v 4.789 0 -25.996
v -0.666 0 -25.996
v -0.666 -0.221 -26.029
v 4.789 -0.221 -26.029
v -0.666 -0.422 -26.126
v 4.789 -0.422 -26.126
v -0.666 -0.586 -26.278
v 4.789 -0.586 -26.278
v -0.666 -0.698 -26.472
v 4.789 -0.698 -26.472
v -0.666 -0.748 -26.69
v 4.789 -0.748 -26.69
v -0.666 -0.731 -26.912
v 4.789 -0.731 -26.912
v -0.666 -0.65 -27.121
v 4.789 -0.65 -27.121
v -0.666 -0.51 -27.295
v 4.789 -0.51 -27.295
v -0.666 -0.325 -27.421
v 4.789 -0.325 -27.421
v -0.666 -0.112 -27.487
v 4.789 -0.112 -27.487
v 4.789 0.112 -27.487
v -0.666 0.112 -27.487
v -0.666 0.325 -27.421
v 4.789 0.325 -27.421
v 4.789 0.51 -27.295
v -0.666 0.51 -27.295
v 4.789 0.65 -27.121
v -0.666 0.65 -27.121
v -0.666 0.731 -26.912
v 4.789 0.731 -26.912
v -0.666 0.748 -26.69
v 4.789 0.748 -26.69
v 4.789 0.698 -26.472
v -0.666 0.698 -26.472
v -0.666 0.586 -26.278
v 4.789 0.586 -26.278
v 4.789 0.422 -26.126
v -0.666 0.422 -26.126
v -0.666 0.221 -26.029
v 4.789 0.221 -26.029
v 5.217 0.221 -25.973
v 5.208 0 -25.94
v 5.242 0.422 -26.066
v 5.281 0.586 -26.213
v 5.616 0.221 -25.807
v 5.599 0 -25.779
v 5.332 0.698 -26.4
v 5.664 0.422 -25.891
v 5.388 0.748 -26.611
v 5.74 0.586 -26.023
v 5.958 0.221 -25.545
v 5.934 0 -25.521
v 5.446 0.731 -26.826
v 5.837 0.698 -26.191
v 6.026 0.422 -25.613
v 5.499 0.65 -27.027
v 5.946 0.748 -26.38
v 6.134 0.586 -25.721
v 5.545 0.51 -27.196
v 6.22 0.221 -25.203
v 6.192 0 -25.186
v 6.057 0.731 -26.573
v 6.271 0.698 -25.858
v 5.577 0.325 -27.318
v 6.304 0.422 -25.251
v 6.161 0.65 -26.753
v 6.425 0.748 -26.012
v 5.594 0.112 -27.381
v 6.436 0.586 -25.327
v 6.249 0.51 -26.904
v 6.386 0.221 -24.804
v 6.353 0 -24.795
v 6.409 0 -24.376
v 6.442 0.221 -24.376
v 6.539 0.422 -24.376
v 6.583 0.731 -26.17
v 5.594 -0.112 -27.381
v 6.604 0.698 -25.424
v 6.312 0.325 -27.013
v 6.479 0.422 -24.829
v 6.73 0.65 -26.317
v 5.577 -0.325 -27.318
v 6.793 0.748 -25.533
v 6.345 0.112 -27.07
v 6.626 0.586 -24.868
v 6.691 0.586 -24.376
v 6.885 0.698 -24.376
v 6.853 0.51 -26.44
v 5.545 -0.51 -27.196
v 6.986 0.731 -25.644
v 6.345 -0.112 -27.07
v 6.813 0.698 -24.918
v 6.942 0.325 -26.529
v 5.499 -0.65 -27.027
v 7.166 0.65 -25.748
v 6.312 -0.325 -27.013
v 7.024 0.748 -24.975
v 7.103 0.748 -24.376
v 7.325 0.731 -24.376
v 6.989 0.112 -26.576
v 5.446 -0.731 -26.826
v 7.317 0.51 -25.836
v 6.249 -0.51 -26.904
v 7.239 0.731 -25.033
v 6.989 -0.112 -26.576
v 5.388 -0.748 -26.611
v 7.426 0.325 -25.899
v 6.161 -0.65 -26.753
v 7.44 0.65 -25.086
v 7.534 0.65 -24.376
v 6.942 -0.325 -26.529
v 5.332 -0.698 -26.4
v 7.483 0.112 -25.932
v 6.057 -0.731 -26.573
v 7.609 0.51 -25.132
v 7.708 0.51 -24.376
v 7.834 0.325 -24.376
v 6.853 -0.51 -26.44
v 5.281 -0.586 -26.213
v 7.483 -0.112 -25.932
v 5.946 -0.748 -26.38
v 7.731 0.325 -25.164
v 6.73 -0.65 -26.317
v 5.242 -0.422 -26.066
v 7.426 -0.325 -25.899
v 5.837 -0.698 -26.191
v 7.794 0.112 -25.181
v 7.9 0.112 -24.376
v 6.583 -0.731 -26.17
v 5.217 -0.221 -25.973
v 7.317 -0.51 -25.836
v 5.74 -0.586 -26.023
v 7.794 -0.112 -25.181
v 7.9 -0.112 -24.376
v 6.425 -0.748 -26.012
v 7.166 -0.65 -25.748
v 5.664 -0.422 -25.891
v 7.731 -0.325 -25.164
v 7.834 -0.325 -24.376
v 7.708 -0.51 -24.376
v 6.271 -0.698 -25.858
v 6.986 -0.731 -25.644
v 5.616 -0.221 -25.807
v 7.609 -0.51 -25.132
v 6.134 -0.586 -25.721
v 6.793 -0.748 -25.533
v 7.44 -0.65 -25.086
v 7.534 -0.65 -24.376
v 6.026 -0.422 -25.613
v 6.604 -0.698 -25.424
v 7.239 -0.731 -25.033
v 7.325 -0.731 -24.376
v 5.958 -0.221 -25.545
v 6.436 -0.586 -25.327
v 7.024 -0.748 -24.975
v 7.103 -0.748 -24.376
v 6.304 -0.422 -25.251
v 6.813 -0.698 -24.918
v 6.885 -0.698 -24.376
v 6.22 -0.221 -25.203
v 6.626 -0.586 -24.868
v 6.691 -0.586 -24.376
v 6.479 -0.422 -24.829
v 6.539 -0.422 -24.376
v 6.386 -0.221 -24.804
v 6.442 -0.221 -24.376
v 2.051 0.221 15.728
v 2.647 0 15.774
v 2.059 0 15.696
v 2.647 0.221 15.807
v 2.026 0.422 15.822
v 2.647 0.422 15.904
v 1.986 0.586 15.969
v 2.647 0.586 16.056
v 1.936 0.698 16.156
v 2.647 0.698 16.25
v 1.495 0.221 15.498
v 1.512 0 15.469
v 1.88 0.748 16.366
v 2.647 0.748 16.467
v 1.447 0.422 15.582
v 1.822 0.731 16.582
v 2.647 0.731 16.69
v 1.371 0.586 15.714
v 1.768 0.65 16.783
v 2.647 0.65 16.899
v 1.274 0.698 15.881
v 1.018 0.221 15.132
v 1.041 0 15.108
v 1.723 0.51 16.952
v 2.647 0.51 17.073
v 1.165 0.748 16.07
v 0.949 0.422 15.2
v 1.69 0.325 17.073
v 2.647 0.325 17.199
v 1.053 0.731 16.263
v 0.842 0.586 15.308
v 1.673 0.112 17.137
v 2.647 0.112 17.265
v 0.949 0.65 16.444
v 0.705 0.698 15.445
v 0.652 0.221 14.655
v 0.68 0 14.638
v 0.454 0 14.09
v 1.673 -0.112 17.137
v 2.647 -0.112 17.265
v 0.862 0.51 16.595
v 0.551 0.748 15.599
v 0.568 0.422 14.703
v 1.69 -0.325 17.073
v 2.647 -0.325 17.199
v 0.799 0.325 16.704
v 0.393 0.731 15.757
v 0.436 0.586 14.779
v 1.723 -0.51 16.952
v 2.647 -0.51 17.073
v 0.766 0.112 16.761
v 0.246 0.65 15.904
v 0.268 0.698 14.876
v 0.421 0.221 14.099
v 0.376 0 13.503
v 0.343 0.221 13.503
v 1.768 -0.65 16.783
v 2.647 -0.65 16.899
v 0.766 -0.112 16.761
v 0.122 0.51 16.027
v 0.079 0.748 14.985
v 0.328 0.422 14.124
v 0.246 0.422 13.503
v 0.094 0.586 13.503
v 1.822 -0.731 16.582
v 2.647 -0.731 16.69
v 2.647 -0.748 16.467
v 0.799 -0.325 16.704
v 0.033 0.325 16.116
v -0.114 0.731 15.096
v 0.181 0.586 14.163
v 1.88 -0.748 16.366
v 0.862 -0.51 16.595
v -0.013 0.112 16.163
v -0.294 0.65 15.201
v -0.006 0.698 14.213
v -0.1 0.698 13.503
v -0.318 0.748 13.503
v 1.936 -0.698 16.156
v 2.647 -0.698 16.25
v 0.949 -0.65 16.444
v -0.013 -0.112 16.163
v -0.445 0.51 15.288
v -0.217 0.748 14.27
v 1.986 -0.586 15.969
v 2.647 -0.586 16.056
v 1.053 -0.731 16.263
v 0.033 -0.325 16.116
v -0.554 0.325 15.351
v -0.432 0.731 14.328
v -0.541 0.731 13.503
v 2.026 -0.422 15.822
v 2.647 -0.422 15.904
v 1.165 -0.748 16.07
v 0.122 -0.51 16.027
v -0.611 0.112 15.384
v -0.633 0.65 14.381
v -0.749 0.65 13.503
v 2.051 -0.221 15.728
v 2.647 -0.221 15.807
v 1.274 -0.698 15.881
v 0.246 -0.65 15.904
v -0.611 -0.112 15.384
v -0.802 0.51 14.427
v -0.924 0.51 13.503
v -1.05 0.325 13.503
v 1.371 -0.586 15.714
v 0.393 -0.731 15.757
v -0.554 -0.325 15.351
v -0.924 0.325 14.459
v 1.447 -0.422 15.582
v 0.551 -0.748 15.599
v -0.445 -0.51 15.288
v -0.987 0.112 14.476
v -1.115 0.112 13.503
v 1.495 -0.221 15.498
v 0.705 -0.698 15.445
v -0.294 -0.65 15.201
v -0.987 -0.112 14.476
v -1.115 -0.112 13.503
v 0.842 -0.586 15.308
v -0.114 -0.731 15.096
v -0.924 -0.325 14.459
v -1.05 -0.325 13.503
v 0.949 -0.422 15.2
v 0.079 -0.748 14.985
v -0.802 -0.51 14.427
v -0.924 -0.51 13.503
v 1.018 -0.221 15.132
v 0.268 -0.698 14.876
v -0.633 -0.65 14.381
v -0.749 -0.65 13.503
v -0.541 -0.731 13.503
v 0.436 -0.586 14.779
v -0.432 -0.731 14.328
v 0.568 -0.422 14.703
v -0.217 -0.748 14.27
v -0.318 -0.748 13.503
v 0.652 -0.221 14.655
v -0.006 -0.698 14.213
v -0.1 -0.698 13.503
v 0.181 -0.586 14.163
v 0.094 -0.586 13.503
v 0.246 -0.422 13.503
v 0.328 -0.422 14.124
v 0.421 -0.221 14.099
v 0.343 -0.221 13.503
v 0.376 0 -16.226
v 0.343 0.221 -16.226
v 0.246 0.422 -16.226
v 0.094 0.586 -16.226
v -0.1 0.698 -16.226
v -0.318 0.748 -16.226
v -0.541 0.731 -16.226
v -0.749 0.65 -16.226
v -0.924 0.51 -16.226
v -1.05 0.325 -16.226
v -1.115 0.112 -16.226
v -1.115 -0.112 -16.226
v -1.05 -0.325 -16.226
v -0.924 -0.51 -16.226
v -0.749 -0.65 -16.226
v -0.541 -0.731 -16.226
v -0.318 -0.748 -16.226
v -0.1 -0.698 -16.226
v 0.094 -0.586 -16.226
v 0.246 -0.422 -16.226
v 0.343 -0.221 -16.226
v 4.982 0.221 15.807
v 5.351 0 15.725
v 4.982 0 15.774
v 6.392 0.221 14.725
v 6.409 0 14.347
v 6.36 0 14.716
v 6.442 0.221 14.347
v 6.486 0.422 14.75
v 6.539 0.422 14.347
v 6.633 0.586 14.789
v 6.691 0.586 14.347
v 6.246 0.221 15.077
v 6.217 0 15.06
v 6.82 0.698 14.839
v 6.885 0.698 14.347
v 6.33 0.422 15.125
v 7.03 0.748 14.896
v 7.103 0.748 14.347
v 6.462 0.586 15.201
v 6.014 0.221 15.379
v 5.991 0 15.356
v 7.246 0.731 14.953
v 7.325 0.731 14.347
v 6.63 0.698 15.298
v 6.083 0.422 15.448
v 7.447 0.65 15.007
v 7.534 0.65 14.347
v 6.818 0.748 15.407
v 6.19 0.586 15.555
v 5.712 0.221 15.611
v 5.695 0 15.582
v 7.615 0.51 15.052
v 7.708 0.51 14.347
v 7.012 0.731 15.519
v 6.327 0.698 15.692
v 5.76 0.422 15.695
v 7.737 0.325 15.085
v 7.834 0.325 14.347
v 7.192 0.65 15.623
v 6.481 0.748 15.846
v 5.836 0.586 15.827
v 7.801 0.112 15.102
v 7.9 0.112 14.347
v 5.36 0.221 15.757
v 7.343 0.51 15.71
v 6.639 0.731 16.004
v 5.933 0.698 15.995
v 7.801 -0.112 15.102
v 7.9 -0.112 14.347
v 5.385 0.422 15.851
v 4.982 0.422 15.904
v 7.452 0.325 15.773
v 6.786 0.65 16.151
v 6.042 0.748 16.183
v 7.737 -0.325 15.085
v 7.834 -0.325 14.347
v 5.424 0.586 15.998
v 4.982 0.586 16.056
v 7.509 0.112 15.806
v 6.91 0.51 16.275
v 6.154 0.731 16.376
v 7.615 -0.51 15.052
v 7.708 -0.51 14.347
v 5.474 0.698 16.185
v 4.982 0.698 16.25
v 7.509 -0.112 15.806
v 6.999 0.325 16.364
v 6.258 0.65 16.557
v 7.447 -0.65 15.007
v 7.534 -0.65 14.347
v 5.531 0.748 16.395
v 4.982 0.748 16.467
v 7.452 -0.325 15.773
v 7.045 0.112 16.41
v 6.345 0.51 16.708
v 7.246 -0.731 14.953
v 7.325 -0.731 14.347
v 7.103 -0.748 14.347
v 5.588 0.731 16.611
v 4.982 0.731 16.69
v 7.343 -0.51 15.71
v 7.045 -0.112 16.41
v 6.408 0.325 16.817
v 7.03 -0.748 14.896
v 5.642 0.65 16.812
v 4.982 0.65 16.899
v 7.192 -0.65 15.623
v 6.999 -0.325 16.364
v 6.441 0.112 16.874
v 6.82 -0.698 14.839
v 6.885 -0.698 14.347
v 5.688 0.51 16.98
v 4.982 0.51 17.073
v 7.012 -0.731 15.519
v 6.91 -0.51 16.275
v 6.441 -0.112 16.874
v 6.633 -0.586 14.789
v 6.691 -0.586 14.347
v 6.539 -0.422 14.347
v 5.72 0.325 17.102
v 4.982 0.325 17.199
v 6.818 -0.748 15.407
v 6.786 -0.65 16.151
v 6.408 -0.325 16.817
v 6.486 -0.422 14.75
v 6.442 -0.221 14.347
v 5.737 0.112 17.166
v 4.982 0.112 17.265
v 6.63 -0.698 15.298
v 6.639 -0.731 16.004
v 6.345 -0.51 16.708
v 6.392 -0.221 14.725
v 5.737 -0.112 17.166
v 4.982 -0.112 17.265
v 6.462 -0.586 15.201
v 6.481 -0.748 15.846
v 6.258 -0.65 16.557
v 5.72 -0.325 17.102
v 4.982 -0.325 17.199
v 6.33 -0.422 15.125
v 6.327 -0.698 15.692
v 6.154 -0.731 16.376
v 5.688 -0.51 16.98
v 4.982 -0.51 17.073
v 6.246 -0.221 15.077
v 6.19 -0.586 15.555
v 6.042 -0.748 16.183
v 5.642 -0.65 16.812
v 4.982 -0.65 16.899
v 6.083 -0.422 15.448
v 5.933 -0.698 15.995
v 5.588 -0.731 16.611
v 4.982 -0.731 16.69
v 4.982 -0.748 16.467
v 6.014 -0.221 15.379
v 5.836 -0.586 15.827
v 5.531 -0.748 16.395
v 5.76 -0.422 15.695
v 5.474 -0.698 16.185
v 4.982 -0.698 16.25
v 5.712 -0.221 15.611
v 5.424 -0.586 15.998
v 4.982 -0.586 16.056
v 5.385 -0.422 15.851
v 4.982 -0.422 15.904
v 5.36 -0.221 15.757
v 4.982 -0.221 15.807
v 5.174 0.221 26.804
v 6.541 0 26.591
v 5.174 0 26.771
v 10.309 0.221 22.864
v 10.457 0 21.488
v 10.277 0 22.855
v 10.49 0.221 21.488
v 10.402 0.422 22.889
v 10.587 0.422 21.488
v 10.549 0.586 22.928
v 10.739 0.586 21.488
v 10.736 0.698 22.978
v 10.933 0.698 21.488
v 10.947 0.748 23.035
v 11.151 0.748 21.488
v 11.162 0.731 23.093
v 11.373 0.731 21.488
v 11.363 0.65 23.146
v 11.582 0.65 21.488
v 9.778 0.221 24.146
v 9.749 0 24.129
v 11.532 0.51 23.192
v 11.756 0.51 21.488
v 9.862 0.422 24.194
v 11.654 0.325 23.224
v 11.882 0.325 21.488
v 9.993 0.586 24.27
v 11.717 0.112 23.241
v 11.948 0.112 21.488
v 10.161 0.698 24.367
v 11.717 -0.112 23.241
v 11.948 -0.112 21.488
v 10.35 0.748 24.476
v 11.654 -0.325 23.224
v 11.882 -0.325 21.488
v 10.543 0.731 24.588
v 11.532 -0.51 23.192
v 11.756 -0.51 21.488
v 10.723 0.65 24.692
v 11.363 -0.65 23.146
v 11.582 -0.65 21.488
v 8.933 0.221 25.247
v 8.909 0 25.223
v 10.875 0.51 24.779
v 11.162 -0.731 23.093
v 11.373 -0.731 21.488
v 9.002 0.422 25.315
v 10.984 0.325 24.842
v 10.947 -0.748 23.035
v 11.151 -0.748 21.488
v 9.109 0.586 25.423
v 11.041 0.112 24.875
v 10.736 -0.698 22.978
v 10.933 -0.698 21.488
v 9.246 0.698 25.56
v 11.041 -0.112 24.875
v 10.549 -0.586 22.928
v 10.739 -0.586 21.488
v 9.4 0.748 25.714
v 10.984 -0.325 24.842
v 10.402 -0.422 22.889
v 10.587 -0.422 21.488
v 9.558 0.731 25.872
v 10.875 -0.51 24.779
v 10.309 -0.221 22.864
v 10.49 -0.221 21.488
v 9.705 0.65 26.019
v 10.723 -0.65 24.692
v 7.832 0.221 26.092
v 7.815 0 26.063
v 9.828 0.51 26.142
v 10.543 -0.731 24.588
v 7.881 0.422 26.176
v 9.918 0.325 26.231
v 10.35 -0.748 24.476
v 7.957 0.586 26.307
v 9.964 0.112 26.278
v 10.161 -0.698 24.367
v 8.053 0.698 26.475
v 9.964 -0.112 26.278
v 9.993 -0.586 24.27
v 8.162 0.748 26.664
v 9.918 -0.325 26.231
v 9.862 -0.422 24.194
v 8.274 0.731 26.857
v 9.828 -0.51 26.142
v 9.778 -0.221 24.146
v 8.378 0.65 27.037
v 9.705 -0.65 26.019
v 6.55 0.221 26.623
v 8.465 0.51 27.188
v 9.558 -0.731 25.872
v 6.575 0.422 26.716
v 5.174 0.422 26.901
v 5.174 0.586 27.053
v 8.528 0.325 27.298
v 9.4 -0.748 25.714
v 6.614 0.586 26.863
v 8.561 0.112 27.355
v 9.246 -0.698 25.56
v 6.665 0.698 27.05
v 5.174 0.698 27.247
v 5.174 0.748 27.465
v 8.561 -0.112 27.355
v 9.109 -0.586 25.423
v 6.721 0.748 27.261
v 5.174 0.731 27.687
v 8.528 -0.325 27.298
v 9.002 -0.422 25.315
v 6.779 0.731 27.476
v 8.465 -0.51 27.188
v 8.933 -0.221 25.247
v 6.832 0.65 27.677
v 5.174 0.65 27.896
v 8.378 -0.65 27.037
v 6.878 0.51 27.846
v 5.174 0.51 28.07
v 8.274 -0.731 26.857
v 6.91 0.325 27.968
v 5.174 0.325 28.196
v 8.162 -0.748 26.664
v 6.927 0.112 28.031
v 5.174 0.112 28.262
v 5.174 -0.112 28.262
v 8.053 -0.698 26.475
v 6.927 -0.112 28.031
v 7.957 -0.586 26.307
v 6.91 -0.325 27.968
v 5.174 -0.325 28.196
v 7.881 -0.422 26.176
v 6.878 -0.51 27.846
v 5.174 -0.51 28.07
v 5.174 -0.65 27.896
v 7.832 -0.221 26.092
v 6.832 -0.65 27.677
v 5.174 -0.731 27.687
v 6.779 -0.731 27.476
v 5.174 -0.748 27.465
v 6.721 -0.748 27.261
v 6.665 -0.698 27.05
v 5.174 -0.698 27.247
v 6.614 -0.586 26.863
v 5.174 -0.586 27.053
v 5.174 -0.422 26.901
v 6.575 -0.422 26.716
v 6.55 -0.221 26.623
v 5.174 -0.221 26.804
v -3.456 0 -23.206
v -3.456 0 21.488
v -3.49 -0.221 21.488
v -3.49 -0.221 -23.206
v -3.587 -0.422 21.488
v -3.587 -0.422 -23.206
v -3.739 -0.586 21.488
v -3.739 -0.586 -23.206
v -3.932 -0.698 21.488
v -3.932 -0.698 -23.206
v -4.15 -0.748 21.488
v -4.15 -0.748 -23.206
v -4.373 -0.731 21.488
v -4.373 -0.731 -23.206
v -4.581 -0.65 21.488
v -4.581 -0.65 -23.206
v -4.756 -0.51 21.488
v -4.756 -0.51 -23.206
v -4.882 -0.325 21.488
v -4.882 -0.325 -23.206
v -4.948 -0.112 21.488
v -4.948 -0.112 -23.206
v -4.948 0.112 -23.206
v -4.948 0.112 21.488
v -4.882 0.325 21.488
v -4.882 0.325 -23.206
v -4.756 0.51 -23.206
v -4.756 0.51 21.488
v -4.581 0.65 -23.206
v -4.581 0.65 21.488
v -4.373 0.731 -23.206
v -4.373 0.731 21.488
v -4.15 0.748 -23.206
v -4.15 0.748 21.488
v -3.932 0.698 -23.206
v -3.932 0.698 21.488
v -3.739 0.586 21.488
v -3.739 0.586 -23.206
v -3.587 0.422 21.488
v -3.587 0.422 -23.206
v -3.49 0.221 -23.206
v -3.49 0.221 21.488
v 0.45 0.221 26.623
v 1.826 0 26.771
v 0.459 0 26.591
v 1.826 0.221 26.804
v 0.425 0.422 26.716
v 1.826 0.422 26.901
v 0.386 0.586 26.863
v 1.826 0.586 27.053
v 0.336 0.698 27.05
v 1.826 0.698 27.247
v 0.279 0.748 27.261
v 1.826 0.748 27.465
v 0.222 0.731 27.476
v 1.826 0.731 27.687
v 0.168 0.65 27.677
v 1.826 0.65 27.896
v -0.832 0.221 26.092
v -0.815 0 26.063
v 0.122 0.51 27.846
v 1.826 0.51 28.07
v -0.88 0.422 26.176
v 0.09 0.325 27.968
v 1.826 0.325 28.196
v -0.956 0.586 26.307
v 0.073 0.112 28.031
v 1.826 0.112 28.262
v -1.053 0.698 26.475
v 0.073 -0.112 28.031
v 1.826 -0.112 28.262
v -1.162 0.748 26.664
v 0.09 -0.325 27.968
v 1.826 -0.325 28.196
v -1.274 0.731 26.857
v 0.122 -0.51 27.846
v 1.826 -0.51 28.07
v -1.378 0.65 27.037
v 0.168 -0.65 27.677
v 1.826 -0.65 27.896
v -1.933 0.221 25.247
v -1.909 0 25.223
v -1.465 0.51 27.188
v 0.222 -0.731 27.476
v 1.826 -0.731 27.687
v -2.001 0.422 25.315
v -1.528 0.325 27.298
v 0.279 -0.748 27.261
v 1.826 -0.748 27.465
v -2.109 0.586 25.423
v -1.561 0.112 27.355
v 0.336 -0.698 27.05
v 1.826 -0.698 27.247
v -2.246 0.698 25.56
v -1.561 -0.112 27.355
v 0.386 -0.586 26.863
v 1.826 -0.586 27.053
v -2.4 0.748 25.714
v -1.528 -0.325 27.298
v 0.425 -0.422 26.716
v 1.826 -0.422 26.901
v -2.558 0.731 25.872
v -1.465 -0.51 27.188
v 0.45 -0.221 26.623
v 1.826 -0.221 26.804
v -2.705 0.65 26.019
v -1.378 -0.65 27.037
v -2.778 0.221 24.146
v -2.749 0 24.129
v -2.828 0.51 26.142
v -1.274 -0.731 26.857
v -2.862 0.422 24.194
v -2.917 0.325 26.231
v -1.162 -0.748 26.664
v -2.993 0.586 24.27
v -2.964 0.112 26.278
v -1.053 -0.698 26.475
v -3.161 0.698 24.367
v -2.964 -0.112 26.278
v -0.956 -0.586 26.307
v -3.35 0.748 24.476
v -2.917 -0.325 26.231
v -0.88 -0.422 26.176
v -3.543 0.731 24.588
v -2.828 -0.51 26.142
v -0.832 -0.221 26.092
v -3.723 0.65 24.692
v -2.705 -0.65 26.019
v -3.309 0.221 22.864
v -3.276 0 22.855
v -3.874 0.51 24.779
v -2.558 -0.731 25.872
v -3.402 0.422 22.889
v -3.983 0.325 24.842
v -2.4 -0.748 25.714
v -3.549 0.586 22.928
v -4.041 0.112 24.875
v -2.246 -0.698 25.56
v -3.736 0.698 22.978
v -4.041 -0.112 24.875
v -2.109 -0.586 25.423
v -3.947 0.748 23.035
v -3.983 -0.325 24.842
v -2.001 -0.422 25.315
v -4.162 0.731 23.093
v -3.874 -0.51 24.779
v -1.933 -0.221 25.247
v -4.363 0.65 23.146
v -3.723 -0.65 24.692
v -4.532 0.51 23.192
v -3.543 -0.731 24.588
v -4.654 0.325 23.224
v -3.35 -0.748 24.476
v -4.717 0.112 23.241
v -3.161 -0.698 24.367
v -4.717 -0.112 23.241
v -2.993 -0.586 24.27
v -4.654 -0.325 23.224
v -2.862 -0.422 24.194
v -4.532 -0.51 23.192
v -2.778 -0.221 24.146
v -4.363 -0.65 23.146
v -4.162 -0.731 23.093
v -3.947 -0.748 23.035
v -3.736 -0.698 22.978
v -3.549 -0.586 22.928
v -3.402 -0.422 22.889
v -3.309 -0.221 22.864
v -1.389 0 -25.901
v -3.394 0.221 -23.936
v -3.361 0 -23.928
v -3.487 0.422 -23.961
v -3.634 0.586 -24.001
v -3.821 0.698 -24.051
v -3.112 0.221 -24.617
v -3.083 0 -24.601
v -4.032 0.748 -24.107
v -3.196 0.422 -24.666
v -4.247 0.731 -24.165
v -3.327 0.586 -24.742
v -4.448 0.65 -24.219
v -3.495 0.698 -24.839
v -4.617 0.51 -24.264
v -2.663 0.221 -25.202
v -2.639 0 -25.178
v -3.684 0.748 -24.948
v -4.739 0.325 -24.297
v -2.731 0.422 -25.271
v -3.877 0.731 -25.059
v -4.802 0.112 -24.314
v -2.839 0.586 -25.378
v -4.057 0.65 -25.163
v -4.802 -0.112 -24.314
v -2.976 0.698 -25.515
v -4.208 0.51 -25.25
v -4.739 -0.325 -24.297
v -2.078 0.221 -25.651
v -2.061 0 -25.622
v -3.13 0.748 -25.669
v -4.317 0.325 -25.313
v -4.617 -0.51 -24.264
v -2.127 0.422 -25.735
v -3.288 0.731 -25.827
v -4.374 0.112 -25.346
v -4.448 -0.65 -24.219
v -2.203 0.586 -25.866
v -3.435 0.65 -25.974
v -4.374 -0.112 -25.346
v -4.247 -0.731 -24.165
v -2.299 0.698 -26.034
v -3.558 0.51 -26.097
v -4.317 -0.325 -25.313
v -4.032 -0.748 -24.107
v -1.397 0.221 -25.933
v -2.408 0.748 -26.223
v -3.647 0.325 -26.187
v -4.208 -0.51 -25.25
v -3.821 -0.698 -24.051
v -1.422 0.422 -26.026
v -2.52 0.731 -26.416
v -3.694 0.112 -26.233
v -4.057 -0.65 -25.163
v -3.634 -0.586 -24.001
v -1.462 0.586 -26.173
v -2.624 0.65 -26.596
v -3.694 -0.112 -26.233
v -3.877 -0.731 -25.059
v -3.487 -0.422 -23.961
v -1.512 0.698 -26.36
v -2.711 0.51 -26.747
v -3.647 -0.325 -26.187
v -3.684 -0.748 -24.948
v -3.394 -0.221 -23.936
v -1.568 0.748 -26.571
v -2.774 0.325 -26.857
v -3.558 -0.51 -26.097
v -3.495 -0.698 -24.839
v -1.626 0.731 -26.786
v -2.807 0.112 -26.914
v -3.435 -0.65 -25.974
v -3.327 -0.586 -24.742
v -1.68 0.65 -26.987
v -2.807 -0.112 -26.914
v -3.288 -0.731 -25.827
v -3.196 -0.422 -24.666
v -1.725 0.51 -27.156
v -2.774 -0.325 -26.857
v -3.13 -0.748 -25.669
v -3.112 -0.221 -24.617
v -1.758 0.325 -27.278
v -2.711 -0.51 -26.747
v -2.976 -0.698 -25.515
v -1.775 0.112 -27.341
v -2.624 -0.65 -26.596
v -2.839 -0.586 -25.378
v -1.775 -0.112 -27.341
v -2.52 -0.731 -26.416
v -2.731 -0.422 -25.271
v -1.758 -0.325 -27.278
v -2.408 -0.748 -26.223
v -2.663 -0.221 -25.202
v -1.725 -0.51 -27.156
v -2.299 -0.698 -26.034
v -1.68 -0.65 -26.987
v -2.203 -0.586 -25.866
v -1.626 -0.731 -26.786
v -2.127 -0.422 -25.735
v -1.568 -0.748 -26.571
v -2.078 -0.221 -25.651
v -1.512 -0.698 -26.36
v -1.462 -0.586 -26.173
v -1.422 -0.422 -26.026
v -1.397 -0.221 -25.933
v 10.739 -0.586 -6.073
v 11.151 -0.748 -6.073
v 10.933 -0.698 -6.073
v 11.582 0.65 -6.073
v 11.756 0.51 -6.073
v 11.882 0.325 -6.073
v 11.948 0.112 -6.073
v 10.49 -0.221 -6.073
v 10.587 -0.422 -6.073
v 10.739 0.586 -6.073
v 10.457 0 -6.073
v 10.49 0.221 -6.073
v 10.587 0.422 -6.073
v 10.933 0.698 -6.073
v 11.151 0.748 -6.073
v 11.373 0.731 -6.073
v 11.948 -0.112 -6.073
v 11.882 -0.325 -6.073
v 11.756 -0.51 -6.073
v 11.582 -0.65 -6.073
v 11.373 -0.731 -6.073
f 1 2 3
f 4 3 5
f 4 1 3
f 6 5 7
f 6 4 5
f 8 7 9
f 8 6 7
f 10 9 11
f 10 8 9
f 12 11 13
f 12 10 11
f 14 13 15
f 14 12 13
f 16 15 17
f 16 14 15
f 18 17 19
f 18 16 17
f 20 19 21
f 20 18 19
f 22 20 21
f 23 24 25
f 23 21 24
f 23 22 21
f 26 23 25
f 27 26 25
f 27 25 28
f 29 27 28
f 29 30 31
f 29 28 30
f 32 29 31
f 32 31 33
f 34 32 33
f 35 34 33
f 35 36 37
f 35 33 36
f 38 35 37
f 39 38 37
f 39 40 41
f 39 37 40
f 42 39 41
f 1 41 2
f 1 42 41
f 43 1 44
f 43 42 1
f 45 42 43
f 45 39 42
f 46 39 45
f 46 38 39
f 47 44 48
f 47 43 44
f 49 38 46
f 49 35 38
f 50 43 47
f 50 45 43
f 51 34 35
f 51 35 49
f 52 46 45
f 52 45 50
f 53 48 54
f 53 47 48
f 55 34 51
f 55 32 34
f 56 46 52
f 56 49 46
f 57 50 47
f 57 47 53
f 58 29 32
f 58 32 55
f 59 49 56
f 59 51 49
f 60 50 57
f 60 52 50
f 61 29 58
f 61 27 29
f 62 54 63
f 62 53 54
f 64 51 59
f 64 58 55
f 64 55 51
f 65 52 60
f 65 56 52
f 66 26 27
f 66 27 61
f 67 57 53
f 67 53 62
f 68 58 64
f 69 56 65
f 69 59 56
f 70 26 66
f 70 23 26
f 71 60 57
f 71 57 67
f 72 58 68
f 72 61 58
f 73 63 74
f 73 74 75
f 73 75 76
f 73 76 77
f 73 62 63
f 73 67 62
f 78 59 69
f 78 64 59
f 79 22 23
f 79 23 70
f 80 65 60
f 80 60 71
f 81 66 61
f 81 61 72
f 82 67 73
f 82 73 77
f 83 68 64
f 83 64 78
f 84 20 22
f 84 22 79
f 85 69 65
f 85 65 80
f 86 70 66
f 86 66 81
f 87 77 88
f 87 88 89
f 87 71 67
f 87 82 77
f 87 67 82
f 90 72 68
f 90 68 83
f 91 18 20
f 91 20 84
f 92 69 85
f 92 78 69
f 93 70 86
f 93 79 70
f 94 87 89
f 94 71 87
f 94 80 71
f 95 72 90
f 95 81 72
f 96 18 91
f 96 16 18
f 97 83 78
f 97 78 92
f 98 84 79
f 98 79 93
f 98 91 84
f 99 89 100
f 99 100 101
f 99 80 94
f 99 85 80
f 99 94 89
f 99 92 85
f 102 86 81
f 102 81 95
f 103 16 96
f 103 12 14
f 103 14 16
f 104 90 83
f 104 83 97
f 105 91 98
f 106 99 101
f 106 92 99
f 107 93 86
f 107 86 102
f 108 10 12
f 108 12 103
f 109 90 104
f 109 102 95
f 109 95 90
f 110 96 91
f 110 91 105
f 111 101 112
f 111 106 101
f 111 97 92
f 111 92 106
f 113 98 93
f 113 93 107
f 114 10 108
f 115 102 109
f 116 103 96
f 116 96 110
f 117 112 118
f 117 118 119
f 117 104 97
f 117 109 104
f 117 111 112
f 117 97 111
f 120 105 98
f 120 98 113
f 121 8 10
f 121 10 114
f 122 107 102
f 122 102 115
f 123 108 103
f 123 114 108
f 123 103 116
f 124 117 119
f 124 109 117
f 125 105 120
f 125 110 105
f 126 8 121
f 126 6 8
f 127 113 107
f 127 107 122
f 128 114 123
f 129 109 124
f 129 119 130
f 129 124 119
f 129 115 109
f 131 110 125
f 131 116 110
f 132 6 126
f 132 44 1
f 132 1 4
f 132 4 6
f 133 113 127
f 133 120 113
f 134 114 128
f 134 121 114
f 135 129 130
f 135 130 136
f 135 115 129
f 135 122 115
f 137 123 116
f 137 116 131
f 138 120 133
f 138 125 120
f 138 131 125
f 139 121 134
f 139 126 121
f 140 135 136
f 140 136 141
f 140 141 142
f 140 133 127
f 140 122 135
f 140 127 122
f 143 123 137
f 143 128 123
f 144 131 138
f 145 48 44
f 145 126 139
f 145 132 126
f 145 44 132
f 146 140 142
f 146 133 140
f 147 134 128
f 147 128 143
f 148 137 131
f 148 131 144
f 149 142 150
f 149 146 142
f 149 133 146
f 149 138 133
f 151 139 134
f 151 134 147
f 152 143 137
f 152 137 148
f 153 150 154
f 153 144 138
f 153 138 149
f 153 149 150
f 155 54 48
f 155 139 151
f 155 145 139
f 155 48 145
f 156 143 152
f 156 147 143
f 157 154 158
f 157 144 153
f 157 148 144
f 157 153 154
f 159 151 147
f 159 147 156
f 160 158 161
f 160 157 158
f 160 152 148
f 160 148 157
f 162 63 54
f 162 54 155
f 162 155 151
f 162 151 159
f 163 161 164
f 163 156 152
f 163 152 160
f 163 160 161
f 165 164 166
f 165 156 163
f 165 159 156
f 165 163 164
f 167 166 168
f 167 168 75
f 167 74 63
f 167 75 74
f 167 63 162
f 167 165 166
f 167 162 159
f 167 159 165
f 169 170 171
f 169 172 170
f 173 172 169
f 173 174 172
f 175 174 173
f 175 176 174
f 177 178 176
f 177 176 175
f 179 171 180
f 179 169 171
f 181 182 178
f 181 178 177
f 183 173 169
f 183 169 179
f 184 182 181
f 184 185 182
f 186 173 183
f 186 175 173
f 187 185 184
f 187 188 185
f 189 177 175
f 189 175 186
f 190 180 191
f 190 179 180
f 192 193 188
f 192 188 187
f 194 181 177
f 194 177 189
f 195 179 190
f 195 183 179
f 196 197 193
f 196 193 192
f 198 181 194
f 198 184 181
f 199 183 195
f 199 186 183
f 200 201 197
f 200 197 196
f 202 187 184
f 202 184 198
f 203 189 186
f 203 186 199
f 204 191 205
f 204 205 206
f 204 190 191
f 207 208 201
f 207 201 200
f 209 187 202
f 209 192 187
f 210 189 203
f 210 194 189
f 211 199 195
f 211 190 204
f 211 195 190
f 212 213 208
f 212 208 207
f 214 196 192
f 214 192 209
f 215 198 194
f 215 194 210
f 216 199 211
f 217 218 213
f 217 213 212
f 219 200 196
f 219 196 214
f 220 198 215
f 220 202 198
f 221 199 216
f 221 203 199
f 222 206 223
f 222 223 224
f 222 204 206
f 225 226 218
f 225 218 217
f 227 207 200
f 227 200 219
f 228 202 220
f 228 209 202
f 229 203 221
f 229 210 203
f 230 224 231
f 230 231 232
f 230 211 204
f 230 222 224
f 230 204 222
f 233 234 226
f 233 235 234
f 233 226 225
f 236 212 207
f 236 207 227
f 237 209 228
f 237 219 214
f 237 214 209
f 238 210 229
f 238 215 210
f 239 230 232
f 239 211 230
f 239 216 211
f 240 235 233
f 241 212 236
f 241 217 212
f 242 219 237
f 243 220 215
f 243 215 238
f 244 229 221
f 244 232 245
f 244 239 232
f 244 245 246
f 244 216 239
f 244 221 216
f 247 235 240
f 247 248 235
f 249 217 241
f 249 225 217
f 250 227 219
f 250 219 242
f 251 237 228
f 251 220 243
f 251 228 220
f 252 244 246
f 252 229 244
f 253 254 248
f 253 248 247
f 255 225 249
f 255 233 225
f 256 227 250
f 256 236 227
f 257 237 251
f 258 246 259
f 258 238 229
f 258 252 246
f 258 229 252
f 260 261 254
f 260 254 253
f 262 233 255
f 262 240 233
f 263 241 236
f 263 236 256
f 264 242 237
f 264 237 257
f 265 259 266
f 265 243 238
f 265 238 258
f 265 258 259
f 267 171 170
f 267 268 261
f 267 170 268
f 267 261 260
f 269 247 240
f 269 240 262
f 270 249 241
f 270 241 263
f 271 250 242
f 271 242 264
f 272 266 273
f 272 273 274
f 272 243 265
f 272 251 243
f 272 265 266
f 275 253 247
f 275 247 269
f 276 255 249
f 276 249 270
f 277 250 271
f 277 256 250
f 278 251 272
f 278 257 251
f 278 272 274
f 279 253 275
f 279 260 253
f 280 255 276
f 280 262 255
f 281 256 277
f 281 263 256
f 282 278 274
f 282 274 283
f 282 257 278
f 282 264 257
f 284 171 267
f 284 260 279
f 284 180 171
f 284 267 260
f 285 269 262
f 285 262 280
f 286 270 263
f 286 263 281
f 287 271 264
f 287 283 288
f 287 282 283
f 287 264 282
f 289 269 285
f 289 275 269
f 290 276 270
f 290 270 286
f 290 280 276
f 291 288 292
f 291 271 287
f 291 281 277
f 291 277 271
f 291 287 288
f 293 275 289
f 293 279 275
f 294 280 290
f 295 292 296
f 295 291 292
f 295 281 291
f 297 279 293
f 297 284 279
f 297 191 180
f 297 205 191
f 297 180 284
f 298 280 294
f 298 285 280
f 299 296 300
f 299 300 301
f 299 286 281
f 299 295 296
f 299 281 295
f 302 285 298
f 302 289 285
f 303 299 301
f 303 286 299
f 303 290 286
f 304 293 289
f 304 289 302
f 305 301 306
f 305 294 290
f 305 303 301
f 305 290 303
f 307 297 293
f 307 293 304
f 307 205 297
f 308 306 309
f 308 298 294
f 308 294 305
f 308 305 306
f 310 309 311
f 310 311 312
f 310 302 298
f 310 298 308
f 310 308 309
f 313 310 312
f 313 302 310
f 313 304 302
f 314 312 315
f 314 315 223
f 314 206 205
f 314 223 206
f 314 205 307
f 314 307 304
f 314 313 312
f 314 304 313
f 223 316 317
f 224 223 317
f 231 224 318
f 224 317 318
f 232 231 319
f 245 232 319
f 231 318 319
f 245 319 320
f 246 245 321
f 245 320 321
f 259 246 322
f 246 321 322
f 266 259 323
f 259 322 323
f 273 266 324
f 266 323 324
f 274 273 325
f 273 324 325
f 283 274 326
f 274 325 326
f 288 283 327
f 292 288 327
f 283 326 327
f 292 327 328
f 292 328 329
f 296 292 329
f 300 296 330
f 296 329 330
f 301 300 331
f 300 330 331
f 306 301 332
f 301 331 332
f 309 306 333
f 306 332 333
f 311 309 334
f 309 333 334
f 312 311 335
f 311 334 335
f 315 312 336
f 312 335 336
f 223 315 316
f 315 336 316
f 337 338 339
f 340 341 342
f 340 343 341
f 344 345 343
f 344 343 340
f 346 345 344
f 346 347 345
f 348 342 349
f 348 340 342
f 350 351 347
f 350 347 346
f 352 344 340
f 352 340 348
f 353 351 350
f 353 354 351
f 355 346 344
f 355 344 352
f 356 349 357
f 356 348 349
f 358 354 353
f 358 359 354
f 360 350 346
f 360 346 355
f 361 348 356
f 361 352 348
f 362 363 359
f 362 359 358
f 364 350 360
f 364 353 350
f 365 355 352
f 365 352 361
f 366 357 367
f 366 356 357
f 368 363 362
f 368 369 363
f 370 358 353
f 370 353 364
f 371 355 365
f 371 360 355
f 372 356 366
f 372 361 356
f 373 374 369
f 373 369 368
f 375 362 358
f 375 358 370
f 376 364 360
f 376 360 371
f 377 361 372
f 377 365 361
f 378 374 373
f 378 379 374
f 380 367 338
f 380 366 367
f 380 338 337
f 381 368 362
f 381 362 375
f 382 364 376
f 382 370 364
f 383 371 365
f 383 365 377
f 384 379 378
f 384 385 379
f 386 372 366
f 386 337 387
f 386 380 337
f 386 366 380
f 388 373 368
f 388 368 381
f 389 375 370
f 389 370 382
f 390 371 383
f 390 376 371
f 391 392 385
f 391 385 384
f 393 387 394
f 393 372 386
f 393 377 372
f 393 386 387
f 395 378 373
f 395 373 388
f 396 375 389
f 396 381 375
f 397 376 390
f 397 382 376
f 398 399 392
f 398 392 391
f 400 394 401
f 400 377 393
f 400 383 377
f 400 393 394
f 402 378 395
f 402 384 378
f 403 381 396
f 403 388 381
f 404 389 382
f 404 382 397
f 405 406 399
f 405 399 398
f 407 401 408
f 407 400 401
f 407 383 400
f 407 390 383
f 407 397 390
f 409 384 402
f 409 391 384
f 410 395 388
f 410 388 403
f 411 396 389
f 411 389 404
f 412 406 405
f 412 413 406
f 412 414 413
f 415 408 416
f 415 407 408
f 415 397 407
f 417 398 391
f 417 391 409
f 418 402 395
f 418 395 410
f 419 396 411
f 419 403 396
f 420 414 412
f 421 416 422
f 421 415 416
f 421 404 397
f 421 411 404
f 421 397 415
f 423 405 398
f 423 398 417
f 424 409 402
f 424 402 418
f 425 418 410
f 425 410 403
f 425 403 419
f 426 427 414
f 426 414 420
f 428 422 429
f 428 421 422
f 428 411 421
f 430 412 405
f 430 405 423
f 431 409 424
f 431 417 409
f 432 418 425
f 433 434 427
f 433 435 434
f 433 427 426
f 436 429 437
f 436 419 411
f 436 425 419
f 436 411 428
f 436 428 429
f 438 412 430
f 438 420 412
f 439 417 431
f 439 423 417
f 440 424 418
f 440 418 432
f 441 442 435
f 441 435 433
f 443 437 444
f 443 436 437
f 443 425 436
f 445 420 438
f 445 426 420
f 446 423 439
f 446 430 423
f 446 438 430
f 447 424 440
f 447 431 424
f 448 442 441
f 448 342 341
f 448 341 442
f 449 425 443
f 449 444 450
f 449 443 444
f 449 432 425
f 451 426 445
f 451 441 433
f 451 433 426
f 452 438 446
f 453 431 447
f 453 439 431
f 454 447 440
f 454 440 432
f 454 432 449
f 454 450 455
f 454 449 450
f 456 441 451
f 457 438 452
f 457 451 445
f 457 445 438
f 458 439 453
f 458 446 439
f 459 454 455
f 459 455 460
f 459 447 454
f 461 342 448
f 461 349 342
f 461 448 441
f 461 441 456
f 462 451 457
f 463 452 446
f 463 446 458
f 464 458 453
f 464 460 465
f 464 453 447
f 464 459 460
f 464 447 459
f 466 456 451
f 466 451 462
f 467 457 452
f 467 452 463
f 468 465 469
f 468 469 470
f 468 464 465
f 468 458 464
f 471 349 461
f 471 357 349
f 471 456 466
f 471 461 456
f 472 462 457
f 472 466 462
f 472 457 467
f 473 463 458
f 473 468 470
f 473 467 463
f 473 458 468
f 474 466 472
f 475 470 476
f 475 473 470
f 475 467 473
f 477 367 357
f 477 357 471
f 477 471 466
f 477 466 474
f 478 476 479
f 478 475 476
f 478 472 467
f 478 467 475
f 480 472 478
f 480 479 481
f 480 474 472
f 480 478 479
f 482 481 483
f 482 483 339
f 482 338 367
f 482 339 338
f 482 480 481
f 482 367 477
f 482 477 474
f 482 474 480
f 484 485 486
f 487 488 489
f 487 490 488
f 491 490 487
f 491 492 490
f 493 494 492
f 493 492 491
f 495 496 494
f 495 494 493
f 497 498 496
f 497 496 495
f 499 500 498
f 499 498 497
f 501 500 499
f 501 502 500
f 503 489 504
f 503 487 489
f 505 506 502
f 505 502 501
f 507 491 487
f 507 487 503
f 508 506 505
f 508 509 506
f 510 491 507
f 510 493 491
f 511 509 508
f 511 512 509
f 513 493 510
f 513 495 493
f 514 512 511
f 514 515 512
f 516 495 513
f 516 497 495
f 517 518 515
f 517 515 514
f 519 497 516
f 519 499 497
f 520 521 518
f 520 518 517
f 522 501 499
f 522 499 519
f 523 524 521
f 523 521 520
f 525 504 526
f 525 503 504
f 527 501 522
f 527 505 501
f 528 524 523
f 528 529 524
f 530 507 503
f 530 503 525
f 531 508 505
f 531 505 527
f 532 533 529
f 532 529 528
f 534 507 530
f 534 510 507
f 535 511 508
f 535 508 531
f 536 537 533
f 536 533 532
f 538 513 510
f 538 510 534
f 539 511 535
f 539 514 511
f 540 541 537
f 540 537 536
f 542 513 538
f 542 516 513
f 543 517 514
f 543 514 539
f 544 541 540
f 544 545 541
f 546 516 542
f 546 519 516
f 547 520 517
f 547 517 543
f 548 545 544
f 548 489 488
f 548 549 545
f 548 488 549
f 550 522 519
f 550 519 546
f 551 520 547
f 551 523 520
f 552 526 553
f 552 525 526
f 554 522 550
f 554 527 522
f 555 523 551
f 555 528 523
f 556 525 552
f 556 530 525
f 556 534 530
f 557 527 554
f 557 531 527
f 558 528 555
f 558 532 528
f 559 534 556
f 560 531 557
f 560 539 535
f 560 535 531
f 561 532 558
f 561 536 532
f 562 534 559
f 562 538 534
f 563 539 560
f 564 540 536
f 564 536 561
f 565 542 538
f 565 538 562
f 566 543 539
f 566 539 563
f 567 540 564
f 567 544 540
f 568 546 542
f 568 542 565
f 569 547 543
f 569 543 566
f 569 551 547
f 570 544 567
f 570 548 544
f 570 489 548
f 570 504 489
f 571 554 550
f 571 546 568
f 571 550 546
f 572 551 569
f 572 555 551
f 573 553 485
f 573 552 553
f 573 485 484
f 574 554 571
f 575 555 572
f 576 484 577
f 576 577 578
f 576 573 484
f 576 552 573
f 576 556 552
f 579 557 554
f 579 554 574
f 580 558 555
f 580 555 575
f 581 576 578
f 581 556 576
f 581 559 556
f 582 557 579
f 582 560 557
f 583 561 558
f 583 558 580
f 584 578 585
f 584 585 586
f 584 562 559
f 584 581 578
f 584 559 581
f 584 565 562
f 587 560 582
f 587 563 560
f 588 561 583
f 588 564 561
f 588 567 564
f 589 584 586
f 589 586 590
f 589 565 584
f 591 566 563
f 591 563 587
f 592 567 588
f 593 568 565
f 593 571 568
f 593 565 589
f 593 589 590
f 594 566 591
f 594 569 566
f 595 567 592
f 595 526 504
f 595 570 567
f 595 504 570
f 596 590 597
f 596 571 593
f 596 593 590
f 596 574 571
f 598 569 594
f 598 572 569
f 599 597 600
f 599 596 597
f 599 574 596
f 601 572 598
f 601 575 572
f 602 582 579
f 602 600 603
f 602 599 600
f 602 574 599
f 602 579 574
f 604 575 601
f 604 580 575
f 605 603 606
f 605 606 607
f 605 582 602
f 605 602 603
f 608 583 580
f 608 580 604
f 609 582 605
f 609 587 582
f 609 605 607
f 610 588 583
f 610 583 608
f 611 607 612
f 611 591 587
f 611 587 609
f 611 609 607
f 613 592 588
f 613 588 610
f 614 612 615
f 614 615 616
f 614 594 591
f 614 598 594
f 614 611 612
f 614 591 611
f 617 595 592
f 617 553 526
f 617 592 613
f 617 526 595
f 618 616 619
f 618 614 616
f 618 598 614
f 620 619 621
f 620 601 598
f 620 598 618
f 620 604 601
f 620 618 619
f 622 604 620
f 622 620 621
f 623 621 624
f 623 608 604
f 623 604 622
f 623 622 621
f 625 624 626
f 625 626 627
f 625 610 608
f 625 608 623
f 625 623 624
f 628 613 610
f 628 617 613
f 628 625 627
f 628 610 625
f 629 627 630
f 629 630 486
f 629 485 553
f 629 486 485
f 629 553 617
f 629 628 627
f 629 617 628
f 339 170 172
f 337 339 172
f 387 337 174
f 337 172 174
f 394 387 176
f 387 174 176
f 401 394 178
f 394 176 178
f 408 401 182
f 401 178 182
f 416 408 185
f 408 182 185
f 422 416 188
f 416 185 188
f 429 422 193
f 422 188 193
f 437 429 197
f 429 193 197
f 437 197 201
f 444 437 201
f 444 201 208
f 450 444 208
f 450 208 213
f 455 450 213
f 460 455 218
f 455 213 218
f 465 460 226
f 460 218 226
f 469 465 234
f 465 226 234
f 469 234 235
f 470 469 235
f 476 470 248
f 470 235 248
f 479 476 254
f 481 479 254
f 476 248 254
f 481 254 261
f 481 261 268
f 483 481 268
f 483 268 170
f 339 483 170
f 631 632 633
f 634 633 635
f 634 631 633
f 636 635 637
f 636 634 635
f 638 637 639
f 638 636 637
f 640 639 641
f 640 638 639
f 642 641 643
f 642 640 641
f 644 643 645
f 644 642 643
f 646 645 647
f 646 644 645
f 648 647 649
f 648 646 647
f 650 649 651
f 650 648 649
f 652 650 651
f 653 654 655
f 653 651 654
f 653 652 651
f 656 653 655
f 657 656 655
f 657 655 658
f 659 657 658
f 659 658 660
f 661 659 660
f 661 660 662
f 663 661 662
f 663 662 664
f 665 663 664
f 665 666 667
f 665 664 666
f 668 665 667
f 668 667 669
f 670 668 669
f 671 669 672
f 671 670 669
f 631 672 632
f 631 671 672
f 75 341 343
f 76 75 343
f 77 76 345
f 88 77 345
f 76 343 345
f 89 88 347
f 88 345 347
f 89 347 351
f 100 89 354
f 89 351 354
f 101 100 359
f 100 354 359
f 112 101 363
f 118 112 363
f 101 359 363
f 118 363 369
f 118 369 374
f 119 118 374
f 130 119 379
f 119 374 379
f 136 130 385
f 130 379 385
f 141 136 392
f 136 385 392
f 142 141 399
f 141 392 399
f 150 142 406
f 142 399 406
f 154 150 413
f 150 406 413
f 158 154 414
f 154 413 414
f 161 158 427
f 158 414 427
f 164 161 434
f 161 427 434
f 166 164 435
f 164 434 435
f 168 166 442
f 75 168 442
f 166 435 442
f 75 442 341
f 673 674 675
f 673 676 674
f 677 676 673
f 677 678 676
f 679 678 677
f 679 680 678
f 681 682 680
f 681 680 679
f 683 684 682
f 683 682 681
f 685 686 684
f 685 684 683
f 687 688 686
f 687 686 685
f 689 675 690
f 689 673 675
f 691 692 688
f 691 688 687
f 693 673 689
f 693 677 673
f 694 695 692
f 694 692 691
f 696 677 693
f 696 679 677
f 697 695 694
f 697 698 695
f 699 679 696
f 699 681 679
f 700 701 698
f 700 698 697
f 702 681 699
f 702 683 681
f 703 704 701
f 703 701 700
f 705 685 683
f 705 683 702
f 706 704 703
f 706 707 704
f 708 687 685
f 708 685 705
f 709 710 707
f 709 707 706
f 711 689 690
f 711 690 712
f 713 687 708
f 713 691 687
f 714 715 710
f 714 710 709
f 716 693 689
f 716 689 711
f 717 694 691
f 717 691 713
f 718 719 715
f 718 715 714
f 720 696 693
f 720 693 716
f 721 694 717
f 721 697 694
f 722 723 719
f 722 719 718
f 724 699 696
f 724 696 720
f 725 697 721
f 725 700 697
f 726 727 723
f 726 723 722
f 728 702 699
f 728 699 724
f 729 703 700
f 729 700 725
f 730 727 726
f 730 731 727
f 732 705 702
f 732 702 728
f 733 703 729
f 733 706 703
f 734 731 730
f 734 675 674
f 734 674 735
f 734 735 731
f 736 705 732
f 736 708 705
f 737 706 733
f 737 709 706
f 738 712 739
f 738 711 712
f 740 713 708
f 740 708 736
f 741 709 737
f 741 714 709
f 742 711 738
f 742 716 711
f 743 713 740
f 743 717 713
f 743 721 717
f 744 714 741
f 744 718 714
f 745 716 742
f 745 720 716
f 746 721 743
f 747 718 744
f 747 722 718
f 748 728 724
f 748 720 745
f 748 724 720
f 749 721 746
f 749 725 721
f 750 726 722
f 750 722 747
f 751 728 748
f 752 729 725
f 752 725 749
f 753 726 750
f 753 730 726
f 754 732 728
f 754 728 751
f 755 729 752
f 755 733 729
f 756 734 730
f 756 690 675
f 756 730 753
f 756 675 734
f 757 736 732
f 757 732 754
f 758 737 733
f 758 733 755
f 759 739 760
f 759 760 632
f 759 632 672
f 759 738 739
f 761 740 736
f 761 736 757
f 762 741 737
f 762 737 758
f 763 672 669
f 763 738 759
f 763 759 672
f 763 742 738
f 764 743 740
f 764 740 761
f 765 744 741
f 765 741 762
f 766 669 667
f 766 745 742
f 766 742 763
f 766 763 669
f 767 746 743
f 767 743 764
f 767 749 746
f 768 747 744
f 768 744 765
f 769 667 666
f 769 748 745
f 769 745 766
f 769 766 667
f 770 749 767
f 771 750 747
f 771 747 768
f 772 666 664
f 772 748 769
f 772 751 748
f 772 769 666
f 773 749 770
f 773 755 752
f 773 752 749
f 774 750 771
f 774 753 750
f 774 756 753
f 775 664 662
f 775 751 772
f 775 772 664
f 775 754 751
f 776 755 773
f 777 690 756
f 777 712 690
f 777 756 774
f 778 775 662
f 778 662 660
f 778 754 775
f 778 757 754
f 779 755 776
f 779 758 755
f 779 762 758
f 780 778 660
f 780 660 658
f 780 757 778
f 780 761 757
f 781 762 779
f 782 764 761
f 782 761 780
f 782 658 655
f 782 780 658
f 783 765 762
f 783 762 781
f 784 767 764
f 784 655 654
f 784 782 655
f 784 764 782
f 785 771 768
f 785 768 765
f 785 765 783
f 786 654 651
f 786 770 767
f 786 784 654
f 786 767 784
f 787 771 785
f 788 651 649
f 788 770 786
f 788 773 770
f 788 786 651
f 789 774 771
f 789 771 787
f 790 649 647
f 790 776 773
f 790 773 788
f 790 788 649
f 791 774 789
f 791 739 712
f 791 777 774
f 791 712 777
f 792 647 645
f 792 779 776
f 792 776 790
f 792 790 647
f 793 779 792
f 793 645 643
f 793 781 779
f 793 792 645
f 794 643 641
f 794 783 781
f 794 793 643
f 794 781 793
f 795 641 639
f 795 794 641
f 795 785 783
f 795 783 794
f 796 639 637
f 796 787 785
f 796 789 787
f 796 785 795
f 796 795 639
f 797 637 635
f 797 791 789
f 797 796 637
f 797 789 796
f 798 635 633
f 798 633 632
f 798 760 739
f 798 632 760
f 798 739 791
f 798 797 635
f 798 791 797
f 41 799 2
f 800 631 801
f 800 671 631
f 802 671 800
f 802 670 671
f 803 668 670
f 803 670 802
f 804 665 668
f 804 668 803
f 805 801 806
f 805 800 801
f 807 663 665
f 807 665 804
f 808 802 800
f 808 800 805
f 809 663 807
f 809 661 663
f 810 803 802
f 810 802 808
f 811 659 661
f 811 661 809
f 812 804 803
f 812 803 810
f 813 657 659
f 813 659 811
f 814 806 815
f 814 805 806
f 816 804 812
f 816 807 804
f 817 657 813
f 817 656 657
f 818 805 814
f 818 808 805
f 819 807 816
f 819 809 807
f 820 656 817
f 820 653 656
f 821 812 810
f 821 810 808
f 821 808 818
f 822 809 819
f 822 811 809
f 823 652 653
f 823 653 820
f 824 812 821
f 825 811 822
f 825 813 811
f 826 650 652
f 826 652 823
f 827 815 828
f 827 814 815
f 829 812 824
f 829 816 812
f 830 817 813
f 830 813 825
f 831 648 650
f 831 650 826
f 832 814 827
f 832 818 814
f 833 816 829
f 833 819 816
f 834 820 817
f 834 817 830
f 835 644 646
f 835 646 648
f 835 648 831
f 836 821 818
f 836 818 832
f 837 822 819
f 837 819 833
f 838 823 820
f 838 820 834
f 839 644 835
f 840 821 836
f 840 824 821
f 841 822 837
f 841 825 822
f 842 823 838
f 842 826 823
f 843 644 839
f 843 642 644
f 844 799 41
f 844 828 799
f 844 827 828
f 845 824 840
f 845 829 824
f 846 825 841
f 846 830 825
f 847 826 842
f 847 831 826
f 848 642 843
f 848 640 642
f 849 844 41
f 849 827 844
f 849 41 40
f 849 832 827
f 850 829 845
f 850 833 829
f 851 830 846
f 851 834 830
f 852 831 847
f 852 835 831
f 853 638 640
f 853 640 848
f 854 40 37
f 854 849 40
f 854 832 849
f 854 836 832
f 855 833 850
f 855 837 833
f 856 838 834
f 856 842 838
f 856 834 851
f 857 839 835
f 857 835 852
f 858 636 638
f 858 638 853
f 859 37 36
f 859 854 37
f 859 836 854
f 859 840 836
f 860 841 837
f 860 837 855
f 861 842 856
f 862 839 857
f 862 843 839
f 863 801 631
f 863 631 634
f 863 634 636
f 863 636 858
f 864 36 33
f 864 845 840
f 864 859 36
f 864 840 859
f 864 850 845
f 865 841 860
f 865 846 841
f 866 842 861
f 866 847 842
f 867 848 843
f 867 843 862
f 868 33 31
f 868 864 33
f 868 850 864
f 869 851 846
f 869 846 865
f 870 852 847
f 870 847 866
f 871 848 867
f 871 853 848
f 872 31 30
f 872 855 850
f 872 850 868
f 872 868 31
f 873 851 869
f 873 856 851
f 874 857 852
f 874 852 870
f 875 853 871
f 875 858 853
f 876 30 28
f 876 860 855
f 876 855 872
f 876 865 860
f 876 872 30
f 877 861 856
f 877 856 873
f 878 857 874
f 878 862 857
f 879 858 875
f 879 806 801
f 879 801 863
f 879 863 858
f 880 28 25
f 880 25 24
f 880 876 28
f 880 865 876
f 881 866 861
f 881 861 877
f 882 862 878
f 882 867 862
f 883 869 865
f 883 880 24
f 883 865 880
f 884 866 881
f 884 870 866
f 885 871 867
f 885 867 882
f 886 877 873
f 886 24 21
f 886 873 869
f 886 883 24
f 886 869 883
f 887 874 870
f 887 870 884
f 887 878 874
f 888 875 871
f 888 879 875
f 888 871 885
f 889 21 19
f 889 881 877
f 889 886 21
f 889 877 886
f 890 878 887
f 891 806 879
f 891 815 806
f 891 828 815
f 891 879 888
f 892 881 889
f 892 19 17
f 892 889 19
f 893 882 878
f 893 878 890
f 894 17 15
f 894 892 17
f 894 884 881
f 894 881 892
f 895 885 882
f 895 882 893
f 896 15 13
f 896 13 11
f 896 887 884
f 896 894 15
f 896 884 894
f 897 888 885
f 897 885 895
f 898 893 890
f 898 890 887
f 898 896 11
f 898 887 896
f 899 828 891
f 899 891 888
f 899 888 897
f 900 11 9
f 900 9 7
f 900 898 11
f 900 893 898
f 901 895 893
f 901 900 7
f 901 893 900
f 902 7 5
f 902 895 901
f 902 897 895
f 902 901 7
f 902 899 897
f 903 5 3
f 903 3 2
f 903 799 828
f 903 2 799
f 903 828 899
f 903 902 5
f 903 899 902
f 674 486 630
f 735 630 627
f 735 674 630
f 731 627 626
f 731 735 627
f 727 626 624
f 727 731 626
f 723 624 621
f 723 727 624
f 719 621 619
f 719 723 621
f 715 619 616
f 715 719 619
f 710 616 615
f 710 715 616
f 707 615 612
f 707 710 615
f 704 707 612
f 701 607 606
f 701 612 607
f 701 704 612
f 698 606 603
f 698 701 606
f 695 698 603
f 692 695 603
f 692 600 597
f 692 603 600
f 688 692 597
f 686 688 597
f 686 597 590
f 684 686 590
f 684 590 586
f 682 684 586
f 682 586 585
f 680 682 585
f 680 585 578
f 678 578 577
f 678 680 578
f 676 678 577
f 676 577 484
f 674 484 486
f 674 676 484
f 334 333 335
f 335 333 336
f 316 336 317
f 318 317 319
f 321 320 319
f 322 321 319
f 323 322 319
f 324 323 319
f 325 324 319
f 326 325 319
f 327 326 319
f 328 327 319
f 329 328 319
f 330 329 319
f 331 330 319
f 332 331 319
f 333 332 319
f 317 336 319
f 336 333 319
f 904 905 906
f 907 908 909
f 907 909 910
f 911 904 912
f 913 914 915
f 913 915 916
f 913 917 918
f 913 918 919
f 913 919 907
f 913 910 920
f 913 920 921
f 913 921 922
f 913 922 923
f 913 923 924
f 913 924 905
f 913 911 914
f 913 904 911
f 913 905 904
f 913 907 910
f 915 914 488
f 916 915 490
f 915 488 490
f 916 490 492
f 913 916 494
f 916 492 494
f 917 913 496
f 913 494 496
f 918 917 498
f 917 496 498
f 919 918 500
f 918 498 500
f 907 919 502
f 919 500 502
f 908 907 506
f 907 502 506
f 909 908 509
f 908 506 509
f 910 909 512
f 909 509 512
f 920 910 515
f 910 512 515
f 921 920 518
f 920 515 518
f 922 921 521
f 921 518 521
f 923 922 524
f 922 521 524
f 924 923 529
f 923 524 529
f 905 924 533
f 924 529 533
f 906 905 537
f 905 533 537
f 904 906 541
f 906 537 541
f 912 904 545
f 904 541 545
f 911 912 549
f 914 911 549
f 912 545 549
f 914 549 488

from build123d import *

# Parameters (mm, degrees)
SKETCH001_R = 0.75


with BuildPart() as part:
    # AdditivePipe: sweep along a path in Sketch
    with BuildLine(Plane.XZ) as additivepipe_path:
        Line((11.17411, -6.073207), (11.17411, 21.488052))
        ThreePointArc((11.17411, 21.488052), (9.416751, 25.730693), (5.17411, 27.488052))
        Line((5.17411, 27.488052), (1.82604, 27.488052))
        ThreePointArc((1.82604, 27.488052), (-2.4166, 25.730693), (-4.17396, 21.488052))
        Line((-4.17396, 21.488052), (-4.17396, -23.205542))
        ThreePointArc((-4.17396, -23.205542), (-3.146623, -25.685752), (-0.666413, -26.713088))
        Line((-0.666413, -26.713088), (4.789174, -26.713088))
        ThreePointArc((4.789174, -26.713088), (6.441629, -26.028619), (7.126097, -24.376165))
        Line((7.126097, -24.376165), (7.126097, 14.346818))
        ThreePointArc((7.126097, 14.346818), (6.498078, 15.862991), (4.981905, 16.491011))
        Line((4.981905, 16.491011), (2.647215, 16.491011))
        ThreePointArc((2.647215, 16.491011), (0.534027, 15.6157), (-0.341284, 13.502512))
        Line((-0.341284, 13.502512), (-0.341284, -16.22648))
    # Sketch001 → AdditivePipe (sweep)
    with BuildSketch(Plane.XY):
        with Locations((-4.206457, 0)):
            Circle(SKETCH001_R)
    sweep(path=additivepipe_path.line)


solid = part.part
